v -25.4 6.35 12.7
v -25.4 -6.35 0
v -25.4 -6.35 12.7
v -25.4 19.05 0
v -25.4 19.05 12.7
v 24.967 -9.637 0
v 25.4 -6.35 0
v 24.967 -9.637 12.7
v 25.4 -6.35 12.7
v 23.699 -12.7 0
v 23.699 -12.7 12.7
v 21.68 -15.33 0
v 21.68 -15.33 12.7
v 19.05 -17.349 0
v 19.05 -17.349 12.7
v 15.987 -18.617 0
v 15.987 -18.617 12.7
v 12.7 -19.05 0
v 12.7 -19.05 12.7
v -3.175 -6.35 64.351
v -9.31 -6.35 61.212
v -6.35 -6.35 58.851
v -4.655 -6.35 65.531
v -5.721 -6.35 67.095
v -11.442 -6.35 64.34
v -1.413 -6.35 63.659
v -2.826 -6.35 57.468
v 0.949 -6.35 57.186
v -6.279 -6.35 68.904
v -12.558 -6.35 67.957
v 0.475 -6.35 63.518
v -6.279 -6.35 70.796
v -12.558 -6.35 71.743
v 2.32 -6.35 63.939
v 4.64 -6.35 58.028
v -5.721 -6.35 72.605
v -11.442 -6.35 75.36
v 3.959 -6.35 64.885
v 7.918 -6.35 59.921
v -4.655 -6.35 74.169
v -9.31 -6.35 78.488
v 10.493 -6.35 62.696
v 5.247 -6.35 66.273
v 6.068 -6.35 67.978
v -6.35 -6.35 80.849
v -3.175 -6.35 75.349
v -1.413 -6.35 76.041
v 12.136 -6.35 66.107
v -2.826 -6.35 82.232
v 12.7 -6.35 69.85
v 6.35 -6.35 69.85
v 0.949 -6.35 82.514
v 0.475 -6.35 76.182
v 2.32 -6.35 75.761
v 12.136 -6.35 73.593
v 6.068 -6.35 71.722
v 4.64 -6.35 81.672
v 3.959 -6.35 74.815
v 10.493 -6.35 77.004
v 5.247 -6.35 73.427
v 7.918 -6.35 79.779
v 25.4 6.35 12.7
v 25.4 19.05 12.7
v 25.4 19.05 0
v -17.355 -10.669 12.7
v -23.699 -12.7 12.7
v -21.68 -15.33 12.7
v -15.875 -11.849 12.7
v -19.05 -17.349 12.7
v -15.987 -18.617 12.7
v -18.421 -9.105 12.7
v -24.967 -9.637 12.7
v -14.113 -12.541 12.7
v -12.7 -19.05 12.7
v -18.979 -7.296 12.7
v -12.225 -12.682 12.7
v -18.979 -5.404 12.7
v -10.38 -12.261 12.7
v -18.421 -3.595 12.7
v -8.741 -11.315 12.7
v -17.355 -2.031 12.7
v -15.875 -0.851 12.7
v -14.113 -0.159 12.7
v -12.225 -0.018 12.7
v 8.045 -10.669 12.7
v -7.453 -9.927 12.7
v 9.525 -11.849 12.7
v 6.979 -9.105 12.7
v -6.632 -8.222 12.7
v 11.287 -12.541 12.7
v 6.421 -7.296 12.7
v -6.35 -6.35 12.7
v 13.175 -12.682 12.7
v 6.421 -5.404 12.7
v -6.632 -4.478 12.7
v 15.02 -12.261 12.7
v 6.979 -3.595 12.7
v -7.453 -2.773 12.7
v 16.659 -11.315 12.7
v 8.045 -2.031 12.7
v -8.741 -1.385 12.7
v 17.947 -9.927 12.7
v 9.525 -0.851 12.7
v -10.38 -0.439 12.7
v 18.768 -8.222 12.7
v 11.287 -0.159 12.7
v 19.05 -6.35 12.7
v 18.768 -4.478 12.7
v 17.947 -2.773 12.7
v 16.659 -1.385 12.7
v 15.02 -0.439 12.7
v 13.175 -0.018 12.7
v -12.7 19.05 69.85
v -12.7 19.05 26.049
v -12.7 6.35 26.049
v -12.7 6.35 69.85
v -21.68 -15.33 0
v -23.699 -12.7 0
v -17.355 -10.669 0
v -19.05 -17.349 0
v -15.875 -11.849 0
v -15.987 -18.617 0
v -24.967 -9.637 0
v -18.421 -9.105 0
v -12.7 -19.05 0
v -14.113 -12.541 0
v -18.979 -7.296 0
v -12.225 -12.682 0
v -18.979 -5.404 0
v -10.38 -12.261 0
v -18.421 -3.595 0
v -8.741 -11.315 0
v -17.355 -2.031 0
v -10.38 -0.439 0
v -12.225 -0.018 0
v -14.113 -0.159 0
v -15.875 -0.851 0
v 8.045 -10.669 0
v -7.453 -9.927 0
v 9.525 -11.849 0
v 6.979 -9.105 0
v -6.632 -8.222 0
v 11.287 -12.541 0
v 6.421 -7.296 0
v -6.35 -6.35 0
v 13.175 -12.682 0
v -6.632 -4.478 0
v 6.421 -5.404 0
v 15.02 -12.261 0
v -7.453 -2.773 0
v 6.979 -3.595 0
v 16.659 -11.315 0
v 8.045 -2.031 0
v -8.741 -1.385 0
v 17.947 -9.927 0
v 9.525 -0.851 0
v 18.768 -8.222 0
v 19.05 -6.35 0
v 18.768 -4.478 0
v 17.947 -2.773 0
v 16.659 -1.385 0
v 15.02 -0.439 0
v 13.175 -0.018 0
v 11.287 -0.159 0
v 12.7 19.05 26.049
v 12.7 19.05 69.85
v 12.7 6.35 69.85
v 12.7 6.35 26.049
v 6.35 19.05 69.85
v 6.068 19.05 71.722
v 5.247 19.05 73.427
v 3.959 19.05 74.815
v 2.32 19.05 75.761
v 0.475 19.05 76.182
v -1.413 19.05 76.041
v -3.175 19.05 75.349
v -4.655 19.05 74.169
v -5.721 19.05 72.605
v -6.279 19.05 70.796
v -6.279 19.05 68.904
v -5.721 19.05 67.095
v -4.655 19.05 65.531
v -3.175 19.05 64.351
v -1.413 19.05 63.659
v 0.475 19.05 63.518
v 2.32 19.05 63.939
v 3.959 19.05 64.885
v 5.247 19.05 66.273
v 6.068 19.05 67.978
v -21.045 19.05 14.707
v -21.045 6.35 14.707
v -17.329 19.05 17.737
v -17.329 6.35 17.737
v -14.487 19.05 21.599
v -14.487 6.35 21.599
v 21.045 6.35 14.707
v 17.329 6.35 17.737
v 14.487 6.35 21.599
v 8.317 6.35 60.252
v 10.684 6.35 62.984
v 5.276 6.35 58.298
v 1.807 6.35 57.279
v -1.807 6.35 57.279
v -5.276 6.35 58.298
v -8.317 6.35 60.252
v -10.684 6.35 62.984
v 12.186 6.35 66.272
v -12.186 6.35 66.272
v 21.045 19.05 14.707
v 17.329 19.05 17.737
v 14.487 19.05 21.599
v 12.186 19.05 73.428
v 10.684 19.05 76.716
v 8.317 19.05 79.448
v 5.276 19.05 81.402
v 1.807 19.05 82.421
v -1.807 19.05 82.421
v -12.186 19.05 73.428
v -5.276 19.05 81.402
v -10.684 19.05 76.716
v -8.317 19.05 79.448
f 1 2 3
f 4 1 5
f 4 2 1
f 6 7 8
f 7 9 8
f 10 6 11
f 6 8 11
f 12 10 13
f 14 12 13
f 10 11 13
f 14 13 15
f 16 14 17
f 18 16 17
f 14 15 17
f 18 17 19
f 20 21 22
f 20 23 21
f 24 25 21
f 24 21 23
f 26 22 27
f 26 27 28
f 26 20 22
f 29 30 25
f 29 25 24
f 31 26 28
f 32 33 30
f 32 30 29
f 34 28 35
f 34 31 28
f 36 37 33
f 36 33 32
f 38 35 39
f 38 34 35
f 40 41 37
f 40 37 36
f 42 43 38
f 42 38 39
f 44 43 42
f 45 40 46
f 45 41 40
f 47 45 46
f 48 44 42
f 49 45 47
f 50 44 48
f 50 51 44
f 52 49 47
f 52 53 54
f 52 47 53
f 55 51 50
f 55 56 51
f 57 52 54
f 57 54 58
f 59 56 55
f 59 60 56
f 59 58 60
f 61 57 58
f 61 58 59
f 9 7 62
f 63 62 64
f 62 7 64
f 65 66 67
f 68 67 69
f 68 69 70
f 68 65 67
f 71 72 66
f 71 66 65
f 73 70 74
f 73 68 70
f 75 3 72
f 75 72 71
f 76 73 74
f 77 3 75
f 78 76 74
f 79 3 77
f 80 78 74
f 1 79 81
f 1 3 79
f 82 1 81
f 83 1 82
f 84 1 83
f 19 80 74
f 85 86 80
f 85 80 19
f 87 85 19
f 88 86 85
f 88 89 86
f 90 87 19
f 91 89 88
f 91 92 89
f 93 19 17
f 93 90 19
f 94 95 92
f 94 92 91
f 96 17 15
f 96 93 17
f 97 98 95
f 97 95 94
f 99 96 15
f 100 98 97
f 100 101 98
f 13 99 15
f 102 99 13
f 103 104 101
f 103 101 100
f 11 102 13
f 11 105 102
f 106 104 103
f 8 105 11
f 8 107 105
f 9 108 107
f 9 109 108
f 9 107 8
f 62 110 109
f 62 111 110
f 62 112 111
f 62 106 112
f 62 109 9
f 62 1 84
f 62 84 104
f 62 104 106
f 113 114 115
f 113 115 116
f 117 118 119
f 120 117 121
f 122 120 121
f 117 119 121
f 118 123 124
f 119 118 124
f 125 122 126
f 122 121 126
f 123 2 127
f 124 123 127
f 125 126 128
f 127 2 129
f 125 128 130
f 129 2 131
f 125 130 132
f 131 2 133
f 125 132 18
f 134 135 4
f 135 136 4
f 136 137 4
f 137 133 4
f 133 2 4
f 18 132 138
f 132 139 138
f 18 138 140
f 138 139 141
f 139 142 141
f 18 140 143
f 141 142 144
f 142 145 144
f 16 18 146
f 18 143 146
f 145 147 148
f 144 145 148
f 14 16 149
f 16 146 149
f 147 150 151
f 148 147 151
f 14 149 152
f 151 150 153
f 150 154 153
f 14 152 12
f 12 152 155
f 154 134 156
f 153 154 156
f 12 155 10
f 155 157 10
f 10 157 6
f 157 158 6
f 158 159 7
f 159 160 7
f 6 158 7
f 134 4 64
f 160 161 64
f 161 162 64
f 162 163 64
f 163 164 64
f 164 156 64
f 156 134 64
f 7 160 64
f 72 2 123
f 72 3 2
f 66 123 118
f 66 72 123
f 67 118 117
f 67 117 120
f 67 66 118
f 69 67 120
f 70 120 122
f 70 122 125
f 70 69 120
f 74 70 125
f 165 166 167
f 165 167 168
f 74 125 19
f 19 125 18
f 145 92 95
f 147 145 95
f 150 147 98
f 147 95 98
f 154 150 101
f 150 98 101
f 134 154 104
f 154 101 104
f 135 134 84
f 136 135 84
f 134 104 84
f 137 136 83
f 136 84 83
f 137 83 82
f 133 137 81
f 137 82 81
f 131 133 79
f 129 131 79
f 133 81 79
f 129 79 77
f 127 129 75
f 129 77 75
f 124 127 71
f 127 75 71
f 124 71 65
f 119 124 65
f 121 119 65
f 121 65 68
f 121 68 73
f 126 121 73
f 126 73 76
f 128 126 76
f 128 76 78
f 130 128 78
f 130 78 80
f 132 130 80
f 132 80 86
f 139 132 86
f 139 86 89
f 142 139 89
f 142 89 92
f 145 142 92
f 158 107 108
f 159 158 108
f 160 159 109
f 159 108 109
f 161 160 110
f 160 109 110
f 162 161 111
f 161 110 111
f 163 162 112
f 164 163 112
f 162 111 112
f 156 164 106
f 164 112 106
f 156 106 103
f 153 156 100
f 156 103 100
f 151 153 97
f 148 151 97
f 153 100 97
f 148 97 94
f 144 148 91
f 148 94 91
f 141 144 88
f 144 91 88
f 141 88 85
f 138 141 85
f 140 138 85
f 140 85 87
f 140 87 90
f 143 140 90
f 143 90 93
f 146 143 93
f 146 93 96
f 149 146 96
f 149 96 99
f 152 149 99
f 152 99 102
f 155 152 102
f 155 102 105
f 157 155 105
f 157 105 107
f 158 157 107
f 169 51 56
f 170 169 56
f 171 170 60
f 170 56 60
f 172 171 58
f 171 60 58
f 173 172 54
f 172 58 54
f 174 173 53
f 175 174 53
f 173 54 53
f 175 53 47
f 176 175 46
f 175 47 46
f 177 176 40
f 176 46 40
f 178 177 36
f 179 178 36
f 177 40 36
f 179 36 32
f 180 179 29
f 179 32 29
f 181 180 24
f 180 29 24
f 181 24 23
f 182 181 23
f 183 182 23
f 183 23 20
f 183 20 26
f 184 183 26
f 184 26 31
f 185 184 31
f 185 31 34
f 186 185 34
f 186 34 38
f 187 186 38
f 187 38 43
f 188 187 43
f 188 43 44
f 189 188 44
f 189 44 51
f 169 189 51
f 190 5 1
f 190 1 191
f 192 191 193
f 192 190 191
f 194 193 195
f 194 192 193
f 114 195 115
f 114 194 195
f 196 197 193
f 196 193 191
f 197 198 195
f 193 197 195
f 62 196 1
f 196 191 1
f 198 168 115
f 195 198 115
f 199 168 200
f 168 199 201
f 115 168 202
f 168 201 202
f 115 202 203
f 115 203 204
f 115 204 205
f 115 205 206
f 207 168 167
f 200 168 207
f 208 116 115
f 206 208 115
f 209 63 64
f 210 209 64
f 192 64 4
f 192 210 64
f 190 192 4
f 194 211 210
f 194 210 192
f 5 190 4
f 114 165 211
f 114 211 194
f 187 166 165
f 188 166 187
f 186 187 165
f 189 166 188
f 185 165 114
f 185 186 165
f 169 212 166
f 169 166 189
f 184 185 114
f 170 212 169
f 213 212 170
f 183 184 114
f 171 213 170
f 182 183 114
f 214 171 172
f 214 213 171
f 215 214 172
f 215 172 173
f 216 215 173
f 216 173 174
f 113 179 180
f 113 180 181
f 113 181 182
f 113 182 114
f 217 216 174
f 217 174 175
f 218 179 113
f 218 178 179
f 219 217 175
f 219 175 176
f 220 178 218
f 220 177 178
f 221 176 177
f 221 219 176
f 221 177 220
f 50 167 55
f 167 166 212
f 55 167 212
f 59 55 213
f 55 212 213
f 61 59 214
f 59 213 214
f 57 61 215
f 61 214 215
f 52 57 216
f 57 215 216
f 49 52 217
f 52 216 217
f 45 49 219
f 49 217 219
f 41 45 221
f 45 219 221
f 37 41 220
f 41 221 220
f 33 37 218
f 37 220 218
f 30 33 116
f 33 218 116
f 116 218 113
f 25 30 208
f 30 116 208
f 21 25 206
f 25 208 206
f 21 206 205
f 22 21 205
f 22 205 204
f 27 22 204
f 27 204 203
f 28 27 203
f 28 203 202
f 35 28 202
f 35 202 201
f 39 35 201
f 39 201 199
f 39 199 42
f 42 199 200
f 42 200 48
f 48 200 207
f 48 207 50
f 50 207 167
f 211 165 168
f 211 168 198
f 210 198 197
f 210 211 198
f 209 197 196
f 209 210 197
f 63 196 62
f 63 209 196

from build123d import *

# Parameters (mm, degrees)
F0_W     = 50.8
F0_H     = 38.1
F1_DEPTH = 12.7
F3_DEPTH = 12.7
F5_DEPTH = 12.7
F6_R     = 6.3499999233
F7_DEPTH = 25.401
F8_R     = 6.35
F9_DEPTH = 12.701
F10_R    = 12.7


with BuildPart() as f1:
    # F0 (on Top) → F1 (new body)
    with BuildSketch(Plane.XY):
        Rectangle(F0_W, F0_H)
    extrude(amount=F1_DEPTH)

    # F2 (on face) → F3 (join)
    with BuildSketch(Plane(origin=(0, 19.05, 0), x_dir=(-1, 0, 0), z_dir=(0, 1, 0))):
        with BuildLine():
            ThreePointArc((-12.7, 26.0490588844), (-17.3287683055, 17.7369875968), (-25.4, 12.7))
            Line((-25.4, 12.7), (-12.7, 12.7))
            Line((-12.7, 12.7), (12.7, 12.7))
            Line((12.7, 12.7), (25.4, 12.7))
            ThreePointArc((25.4, 12.7), (17.3287683055, 17.7369875968), (12.7, 26.0490588844))
            Line((12.7, 26.0490588844), (12.7, 69.85))
            ThreePointArc((12.7, 69.85), (0, 57.15), (-12.7, 69.85))
            Line((-12.7, 69.85), (-12.7, 26.0490588844))
        make_face()
        with BuildLine():
            ThreePointArc((12.7, 69.85), (0, 82.55), (-12.7, 69.85))
            ThreePointArc((-12.7, 69.85), (0, 57.15), (12.7, 69.85))
        make_face()
    extrude(amount=-F3_DEPTH)

    # F4 (on face) → F5 (join)
    with BuildSketch(Plane.XZ.offset(-6.35)):
        with BuildLine():
            ThreePointArc((-12.7, 69.85), (0, 57.15), (12.7, 69.85))
            ThreePointArc((12.7, 69.85), (0, 82.55), (-12.7, 69.85))
        make_face()
    extrude(amount=F5_DEPTH)

    # F6 (on face) → F7 (cut, through all)
    with BuildSketch(Plane.XZ.offset(6.35)):
        with Locations((0, 69.85)):
            Circle(F6_R)
    extrude(amount=-F7_DEPTH, mode=Mode.SUBTRACT)

    # F8 (on face) → F9 (cut, through all)
    with BuildSketch(Plane.XY.offset(12.7)):
        with Locations((-12.7, -6.35)):
            Circle(F8_R)
        with Locations((12.7, -6.35)):
            Circle(F8_R)
    extrude(amount=-F9_DEPTH, mode=Mode.SUBTRACT)

    # F10
    f10_edges = [f1.edges().sort_by_distance(p)[0] for p in [
        (-25.4, -19.05, 6.35),
        (25.4, -19.05, 6.35),
    ]]
    fillet(f10_edges, radius=F10_R)


solid = f1.part
